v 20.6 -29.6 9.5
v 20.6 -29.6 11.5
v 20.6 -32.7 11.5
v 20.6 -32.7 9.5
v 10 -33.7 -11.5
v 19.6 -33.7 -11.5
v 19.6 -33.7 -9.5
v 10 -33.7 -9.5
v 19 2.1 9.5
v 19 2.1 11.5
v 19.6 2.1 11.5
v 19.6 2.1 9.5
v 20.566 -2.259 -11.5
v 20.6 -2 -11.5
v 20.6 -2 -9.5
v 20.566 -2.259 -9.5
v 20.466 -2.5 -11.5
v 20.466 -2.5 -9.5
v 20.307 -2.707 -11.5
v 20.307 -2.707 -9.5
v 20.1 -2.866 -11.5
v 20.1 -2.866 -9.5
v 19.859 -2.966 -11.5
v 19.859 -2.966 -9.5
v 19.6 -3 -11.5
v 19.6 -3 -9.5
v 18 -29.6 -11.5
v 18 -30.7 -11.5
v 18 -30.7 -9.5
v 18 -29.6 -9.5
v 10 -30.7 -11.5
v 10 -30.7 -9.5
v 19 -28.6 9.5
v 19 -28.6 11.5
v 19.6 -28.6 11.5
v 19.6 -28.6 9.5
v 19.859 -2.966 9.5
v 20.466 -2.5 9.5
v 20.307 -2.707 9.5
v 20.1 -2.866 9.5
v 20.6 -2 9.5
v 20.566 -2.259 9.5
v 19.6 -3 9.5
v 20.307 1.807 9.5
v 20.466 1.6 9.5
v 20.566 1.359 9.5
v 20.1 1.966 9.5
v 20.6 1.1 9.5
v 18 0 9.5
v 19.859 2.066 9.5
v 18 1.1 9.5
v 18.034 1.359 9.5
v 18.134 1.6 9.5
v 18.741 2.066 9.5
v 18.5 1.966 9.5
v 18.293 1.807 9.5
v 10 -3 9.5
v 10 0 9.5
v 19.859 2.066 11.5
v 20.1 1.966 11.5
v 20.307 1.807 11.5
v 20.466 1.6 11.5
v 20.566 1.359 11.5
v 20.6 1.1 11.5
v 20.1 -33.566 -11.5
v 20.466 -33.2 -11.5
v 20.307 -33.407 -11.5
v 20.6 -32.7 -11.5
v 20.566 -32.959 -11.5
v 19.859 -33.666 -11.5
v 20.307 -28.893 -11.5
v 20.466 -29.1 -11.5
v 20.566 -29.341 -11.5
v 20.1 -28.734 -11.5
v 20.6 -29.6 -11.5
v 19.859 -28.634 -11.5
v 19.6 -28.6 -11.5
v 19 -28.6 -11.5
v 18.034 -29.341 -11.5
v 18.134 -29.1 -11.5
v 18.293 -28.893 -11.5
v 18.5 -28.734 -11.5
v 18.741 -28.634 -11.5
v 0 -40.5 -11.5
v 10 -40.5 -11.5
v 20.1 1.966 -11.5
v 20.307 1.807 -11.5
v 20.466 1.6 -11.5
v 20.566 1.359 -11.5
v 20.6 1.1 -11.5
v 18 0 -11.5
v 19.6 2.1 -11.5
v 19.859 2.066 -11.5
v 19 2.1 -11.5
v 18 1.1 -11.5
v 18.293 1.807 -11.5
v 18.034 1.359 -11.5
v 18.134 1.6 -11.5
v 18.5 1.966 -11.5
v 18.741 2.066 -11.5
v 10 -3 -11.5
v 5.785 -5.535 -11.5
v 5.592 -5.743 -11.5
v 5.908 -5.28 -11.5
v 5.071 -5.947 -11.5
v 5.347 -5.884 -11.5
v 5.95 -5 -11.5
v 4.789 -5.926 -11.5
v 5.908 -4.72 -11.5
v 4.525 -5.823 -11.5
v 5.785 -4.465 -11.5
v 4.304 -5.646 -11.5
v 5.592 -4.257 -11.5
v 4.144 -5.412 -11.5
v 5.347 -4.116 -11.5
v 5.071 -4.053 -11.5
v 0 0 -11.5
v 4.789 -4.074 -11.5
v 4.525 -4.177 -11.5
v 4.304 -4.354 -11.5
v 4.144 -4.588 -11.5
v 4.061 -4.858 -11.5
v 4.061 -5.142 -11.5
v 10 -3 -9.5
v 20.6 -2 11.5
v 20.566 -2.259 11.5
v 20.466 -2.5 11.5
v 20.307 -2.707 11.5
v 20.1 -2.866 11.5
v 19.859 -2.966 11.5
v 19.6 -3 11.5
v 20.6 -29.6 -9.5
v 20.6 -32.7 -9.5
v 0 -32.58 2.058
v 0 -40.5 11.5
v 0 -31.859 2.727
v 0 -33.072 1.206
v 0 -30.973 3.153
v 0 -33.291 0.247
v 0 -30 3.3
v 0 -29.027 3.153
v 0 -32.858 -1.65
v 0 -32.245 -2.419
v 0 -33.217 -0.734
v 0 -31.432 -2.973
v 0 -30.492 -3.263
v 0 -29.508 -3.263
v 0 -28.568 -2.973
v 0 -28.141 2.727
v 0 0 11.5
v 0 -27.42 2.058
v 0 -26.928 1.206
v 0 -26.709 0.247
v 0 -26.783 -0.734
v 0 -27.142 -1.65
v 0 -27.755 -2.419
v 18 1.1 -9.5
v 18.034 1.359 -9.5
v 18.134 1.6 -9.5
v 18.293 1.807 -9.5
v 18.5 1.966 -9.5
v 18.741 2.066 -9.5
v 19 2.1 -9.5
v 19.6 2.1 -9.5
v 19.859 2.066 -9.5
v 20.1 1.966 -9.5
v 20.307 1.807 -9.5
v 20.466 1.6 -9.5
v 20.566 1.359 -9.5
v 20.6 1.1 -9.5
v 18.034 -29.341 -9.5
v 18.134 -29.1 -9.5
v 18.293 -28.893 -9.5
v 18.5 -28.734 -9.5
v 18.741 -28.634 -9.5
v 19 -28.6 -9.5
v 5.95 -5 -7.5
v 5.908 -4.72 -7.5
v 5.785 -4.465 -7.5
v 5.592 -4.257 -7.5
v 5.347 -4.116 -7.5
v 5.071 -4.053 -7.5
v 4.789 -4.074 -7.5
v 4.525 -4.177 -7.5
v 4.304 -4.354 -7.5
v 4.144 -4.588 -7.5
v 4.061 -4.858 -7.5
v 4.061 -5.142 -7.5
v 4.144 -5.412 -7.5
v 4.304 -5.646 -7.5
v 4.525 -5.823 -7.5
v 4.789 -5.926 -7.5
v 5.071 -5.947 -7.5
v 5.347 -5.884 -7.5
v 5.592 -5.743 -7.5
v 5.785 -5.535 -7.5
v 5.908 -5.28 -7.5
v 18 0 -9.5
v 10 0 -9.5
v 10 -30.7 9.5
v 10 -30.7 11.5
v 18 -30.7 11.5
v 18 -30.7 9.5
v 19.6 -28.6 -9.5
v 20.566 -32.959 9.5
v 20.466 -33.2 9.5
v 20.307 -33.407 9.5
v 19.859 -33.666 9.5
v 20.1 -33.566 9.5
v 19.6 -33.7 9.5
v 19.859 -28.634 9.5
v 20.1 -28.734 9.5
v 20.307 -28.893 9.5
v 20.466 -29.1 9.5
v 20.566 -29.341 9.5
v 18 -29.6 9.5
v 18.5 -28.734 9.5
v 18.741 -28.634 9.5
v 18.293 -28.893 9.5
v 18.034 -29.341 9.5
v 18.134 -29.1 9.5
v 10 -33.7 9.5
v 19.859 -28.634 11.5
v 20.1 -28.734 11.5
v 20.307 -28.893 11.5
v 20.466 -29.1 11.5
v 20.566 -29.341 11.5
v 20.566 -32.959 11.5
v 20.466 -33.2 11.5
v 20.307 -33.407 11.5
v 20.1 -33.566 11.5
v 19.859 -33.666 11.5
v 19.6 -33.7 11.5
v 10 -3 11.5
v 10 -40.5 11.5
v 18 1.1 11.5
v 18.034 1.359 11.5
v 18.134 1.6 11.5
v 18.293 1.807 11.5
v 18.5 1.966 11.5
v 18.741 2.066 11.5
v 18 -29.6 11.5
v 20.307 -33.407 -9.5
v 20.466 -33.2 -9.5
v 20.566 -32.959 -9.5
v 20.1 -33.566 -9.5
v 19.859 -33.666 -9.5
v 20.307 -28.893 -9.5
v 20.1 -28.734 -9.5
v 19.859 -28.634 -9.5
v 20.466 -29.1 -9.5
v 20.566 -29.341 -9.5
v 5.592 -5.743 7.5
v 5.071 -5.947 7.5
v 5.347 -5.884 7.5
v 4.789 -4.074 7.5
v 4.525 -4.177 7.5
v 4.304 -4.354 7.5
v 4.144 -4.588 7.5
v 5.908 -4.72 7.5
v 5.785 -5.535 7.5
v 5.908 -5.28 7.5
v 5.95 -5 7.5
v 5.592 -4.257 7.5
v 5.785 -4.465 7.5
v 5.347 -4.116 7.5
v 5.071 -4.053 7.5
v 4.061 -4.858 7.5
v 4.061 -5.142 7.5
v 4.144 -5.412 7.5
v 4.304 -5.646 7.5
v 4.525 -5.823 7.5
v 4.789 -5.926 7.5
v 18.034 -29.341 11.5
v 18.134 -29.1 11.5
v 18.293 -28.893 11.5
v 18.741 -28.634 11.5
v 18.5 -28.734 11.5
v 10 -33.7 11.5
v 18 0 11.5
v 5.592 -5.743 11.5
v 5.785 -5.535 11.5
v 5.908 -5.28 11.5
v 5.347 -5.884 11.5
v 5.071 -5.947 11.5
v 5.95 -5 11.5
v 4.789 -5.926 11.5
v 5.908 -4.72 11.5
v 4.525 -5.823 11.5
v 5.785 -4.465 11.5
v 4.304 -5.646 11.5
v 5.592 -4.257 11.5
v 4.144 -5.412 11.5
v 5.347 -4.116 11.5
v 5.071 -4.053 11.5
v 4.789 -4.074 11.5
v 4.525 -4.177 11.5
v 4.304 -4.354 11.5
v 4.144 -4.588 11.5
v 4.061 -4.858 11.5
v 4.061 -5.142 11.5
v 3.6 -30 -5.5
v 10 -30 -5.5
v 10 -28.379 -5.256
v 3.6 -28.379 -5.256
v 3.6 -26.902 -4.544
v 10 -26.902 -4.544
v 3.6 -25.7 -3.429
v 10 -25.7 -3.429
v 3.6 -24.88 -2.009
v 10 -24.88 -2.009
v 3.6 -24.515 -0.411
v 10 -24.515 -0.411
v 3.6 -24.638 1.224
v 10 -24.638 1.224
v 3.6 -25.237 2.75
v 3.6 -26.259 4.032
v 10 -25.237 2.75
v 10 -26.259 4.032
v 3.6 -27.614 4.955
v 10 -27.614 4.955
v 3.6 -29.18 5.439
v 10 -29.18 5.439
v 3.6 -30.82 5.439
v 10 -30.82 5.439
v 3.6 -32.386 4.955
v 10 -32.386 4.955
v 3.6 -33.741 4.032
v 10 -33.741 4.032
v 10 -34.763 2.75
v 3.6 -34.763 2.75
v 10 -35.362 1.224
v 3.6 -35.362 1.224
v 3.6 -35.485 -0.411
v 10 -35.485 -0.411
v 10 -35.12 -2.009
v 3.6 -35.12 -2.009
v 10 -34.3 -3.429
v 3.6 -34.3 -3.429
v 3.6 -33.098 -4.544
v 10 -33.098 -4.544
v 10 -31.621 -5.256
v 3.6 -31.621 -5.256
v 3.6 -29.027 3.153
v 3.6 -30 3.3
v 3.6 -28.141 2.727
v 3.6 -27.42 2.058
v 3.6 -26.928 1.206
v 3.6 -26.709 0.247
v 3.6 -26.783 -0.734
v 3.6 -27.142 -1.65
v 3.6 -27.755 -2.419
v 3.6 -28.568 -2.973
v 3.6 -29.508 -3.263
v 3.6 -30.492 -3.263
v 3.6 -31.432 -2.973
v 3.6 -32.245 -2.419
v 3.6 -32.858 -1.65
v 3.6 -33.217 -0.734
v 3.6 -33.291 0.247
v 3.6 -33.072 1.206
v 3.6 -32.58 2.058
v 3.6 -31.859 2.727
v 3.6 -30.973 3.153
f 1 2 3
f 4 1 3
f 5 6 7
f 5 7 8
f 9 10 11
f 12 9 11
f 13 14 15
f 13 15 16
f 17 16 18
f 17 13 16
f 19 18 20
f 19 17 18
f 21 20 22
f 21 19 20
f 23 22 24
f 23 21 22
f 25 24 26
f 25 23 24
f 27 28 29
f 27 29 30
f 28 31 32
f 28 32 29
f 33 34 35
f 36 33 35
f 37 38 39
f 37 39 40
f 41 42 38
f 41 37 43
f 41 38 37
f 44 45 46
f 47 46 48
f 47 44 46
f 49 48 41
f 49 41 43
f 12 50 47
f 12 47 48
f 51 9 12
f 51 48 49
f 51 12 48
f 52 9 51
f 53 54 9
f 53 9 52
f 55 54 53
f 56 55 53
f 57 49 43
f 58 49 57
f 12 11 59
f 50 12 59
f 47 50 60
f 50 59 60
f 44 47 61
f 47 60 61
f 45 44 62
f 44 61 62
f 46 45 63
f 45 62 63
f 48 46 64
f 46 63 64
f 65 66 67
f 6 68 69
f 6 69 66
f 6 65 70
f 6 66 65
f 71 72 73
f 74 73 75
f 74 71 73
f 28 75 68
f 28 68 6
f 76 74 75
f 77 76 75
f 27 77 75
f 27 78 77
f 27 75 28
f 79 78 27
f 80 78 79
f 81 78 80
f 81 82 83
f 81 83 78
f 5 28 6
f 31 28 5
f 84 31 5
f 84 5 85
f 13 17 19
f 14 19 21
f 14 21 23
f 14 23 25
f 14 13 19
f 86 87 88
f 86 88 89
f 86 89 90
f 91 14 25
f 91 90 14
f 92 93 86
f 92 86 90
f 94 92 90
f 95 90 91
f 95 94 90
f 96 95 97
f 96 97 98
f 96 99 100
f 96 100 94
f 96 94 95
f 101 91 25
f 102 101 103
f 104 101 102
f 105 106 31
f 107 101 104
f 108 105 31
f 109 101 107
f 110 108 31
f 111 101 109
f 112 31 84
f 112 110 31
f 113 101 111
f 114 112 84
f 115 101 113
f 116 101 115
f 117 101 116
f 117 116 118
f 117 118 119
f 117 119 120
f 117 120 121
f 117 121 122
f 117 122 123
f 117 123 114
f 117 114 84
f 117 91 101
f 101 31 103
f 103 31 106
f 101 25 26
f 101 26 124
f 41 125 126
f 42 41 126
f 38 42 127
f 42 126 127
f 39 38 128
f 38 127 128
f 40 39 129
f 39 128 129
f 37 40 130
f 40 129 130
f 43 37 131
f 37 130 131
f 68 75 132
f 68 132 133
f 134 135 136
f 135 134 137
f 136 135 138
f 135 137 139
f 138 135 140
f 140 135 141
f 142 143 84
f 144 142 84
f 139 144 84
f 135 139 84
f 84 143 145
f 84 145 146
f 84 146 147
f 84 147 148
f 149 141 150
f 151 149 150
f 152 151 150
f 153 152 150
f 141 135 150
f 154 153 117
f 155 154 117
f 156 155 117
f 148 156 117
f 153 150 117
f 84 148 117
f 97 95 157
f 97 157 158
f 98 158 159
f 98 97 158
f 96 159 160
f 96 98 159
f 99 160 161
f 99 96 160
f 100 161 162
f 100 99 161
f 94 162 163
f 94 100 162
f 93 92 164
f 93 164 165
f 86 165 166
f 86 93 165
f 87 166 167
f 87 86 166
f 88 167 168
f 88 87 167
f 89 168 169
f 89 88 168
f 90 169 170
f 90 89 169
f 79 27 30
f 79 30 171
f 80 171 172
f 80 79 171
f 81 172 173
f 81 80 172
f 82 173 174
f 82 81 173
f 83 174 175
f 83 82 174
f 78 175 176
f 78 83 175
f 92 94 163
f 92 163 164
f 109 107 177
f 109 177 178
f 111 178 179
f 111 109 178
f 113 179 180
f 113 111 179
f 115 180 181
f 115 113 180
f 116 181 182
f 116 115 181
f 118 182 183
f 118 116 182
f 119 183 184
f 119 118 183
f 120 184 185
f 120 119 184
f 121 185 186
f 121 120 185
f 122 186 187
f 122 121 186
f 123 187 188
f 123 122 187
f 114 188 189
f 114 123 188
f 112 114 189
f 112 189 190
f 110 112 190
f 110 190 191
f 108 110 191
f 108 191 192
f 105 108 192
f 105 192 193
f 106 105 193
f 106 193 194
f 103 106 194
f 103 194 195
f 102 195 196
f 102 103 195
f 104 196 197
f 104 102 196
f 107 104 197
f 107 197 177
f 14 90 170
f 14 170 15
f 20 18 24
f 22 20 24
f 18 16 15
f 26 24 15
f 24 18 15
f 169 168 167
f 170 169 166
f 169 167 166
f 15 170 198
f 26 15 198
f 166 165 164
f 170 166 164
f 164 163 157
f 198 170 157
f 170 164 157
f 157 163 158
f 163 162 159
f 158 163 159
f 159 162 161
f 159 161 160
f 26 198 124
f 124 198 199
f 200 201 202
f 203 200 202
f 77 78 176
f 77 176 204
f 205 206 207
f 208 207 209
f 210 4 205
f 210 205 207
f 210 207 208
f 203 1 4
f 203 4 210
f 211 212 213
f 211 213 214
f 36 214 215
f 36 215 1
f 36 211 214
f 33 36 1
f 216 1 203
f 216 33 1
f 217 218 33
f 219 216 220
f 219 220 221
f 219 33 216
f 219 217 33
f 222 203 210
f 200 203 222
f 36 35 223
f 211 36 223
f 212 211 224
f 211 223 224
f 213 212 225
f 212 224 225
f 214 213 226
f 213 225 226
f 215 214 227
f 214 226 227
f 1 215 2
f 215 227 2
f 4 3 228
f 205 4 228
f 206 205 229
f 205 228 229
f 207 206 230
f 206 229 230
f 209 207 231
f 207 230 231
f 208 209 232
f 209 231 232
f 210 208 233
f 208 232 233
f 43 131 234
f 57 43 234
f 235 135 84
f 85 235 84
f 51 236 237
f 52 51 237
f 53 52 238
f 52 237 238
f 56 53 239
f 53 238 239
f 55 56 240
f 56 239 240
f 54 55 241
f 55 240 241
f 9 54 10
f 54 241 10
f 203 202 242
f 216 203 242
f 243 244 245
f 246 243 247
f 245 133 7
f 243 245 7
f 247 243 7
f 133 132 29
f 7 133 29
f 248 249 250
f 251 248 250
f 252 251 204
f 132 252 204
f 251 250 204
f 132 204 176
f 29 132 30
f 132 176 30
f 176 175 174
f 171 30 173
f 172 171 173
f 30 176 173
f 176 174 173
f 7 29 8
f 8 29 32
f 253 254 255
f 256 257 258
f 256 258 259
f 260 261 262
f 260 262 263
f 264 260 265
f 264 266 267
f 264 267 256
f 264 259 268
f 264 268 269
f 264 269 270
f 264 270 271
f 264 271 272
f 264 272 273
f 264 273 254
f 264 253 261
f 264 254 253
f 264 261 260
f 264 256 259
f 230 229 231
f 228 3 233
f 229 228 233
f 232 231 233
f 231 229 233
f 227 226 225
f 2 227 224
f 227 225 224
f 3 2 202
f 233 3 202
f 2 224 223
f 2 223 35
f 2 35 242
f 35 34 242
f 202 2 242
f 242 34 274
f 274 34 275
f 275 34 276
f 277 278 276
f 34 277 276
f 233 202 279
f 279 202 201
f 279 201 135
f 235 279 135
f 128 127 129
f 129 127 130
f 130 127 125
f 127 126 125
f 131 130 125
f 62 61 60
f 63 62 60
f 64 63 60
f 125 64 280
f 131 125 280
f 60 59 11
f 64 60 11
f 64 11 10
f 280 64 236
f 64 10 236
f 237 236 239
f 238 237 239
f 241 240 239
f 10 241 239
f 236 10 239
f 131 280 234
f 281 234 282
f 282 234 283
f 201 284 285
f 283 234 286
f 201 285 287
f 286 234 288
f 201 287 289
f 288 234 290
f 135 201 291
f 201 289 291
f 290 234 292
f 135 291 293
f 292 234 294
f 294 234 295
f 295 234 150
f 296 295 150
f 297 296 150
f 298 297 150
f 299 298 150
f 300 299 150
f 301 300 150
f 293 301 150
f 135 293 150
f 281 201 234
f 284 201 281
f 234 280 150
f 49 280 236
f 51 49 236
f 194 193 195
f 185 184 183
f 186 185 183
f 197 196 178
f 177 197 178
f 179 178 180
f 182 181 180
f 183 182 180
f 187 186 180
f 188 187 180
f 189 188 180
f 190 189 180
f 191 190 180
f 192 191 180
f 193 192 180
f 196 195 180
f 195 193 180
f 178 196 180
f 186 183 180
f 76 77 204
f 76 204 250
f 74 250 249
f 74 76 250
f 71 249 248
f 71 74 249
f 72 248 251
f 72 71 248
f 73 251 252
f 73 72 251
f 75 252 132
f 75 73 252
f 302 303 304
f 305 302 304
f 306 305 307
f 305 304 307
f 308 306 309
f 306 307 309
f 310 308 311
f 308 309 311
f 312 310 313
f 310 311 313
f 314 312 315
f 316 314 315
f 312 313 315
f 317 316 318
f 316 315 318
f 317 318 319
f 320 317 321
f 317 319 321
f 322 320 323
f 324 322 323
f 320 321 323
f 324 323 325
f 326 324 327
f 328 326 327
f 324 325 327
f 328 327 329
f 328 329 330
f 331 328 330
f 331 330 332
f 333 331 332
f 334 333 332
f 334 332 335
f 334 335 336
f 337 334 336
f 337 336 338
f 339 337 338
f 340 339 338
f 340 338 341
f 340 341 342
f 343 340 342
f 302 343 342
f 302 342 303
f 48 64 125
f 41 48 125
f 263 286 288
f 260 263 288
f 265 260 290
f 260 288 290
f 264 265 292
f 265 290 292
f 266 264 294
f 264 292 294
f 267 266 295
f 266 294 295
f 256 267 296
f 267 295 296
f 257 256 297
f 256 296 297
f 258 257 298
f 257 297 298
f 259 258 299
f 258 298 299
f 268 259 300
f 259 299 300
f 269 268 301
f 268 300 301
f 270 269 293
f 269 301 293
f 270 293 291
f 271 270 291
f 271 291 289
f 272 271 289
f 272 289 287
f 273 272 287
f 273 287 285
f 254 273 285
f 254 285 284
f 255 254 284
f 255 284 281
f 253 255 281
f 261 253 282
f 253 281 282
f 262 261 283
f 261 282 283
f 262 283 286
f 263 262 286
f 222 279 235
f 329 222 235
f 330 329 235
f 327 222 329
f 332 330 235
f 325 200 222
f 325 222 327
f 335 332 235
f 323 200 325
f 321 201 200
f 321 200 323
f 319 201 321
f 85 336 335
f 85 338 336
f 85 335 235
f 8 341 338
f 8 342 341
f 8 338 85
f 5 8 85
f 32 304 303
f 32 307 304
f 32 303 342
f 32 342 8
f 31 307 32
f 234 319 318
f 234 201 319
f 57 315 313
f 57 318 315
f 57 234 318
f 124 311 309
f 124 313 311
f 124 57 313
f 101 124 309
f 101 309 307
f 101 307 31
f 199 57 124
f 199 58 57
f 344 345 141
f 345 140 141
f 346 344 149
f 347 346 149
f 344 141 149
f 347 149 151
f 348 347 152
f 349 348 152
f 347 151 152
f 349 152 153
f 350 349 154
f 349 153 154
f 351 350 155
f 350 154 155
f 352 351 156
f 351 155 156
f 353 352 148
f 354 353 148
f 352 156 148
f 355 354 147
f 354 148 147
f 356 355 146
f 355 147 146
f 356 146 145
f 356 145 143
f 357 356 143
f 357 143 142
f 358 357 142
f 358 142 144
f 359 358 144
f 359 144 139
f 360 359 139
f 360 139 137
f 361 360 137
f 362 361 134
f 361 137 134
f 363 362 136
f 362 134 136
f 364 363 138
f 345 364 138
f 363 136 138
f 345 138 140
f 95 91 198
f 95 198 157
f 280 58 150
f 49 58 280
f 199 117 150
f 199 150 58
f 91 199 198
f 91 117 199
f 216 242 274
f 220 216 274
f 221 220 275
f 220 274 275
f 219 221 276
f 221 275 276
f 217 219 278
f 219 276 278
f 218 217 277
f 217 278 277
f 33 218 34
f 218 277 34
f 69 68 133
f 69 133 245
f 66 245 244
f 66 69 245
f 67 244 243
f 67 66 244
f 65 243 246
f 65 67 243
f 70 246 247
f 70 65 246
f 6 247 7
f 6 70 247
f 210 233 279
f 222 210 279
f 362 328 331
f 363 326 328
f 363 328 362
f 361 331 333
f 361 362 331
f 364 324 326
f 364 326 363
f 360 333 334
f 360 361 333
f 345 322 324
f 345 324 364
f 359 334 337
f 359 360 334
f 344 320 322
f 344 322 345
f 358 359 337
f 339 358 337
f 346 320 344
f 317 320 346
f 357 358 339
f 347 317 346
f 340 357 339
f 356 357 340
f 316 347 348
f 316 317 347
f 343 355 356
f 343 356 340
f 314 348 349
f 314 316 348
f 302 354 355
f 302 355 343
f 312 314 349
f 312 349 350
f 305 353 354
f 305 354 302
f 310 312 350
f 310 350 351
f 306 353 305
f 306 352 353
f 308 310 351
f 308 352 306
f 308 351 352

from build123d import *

# Parameters (mm, degrees)
SKETCH1_W                                         = 23
SKETCH1_H                                         = 40.5
BOSS_EXTRUDE1_DEPTH                               = 10
CHAMBRAGE_POUR_VIS_SIX_PANS_CREUX_M61_D           = 6.6
CHAMBRAGE_POUR_VIS_SIX_PANS_CREUX_M61_CBORE_D     = 11
CHAMBRAGE_POUR_VIS_SIX_PANS_CREUX_M61_CBORE_DEPTH = 6.4
BOSS_EXTRUDE2_DEPTH                               = 2
ESQUISSE5_R                                       = 0.95
ENL_V_MAT_EXTRU_1_DEPTH                           = 4


with BuildPart() as part:
    # Sketch1 → Boss-Extrude1 (new body)
    with BuildSketch(Plane(origin=(0, 0, 0), x_dir=(0, 0, -1), z_dir=(1, 0, 0))):
        with Locations((0, -20.25)):
            Rectangle(SKETCH1_W, SKETCH1_H)
    extrude(amount=BOSS_EXTRUDE1_DEPTH)

    # Chambrage pour vis à six pans creux M61 (through all)
    with Locations(Plane(origin=(10, 0, 0), x_dir=(0, 0, -1), z_dir=(1, 0, 0))):
        with Locations((0, -30)):
            CounterBoreHole(CHAMBRAGE_POUR_VIS_SIX_PANS_CREUX_M61_D / 2, CHAMBRAGE_POUR_VIS_SIX_PANS_CREUX_M61_CBORE_D / 2, CHAMBRAGE_POUR_VIS_SIX_PANS_CREUX_M61_CBORE_DEPTH)

    # Sketch4 → Boss-Extrude2 (add)
    with BuildSketch(Plane.XY.offset(11.5)):
        with BuildLine():
            Line((10, 0), (18, 0))
            Line((18, 0), (18, 1.1))
            ThreePointArc((18, 1.1), (18.292893219, 1.807106781), (19, 2.1))
            Line((19, 2.1), (19.6, 2.1))
            ThreePointArc((19.6, 2.1), (20.307106781, 1.807106781), (20.6, 1.1))
            Line((20.6, 1.1), (20.6, -2))
            ThreePointArc((20.6, -2), (20.307106781, -2.707106781), (19.6, -3))
            Line((19.6, -3), (10, -3))
            Line((10, -3), (10, 0))
        make_face()
        with BuildLine():
            Line((10, -30.7), (18, -30.7))
            Line((18, -30.7), (18, -29.6))
            ThreePointArc((18, -29.6), (18.292893219, -28.892893219), (19, -28.6))
            Line((19, -28.6), (19.6, -28.6))
            ThreePointArc((19.6, -28.6), (20.307106781, -28.892893219), (20.6, -29.6))
            Line((20.6, -29.6), (20.6, -32.7))
            ThreePointArc((20.6, -32.7), (20.307106781, -33.407106781), (19.6, -33.7))
            Line((19.6, -33.7), (10, -33.7))
            Line((10, -33.7), (10, -30.7))
        make_face()
    boss_extrude2 = extrude(amount=-BOSS_EXTRUDE2_DEPTH)

    # Mirror1: Boss-Extrude2 across plane
    add(boss_extrude2.mirror(Plane.XY))

    # Esquisse5 → Enlèv. mat.-Extru.1 (cut)
    with BuildSketch(Plane.XY.offset(11.5)):
        with Locations((5, -5)):
            Circle(ESQUISSE5_R)
    enl_v_mat_extru_1 = extrude(amount=-ENL_V_MAT_EXTRU_1_DEPTH, mode=Mode.SUBTRACT)

    # Symétrie1: Enlèv. mat.-Extru.1 across plane
    add(enl_v_mat_extru_1.mirror(Plane.XY), mode=Mode.SUBTRACT)


solid = part.part
